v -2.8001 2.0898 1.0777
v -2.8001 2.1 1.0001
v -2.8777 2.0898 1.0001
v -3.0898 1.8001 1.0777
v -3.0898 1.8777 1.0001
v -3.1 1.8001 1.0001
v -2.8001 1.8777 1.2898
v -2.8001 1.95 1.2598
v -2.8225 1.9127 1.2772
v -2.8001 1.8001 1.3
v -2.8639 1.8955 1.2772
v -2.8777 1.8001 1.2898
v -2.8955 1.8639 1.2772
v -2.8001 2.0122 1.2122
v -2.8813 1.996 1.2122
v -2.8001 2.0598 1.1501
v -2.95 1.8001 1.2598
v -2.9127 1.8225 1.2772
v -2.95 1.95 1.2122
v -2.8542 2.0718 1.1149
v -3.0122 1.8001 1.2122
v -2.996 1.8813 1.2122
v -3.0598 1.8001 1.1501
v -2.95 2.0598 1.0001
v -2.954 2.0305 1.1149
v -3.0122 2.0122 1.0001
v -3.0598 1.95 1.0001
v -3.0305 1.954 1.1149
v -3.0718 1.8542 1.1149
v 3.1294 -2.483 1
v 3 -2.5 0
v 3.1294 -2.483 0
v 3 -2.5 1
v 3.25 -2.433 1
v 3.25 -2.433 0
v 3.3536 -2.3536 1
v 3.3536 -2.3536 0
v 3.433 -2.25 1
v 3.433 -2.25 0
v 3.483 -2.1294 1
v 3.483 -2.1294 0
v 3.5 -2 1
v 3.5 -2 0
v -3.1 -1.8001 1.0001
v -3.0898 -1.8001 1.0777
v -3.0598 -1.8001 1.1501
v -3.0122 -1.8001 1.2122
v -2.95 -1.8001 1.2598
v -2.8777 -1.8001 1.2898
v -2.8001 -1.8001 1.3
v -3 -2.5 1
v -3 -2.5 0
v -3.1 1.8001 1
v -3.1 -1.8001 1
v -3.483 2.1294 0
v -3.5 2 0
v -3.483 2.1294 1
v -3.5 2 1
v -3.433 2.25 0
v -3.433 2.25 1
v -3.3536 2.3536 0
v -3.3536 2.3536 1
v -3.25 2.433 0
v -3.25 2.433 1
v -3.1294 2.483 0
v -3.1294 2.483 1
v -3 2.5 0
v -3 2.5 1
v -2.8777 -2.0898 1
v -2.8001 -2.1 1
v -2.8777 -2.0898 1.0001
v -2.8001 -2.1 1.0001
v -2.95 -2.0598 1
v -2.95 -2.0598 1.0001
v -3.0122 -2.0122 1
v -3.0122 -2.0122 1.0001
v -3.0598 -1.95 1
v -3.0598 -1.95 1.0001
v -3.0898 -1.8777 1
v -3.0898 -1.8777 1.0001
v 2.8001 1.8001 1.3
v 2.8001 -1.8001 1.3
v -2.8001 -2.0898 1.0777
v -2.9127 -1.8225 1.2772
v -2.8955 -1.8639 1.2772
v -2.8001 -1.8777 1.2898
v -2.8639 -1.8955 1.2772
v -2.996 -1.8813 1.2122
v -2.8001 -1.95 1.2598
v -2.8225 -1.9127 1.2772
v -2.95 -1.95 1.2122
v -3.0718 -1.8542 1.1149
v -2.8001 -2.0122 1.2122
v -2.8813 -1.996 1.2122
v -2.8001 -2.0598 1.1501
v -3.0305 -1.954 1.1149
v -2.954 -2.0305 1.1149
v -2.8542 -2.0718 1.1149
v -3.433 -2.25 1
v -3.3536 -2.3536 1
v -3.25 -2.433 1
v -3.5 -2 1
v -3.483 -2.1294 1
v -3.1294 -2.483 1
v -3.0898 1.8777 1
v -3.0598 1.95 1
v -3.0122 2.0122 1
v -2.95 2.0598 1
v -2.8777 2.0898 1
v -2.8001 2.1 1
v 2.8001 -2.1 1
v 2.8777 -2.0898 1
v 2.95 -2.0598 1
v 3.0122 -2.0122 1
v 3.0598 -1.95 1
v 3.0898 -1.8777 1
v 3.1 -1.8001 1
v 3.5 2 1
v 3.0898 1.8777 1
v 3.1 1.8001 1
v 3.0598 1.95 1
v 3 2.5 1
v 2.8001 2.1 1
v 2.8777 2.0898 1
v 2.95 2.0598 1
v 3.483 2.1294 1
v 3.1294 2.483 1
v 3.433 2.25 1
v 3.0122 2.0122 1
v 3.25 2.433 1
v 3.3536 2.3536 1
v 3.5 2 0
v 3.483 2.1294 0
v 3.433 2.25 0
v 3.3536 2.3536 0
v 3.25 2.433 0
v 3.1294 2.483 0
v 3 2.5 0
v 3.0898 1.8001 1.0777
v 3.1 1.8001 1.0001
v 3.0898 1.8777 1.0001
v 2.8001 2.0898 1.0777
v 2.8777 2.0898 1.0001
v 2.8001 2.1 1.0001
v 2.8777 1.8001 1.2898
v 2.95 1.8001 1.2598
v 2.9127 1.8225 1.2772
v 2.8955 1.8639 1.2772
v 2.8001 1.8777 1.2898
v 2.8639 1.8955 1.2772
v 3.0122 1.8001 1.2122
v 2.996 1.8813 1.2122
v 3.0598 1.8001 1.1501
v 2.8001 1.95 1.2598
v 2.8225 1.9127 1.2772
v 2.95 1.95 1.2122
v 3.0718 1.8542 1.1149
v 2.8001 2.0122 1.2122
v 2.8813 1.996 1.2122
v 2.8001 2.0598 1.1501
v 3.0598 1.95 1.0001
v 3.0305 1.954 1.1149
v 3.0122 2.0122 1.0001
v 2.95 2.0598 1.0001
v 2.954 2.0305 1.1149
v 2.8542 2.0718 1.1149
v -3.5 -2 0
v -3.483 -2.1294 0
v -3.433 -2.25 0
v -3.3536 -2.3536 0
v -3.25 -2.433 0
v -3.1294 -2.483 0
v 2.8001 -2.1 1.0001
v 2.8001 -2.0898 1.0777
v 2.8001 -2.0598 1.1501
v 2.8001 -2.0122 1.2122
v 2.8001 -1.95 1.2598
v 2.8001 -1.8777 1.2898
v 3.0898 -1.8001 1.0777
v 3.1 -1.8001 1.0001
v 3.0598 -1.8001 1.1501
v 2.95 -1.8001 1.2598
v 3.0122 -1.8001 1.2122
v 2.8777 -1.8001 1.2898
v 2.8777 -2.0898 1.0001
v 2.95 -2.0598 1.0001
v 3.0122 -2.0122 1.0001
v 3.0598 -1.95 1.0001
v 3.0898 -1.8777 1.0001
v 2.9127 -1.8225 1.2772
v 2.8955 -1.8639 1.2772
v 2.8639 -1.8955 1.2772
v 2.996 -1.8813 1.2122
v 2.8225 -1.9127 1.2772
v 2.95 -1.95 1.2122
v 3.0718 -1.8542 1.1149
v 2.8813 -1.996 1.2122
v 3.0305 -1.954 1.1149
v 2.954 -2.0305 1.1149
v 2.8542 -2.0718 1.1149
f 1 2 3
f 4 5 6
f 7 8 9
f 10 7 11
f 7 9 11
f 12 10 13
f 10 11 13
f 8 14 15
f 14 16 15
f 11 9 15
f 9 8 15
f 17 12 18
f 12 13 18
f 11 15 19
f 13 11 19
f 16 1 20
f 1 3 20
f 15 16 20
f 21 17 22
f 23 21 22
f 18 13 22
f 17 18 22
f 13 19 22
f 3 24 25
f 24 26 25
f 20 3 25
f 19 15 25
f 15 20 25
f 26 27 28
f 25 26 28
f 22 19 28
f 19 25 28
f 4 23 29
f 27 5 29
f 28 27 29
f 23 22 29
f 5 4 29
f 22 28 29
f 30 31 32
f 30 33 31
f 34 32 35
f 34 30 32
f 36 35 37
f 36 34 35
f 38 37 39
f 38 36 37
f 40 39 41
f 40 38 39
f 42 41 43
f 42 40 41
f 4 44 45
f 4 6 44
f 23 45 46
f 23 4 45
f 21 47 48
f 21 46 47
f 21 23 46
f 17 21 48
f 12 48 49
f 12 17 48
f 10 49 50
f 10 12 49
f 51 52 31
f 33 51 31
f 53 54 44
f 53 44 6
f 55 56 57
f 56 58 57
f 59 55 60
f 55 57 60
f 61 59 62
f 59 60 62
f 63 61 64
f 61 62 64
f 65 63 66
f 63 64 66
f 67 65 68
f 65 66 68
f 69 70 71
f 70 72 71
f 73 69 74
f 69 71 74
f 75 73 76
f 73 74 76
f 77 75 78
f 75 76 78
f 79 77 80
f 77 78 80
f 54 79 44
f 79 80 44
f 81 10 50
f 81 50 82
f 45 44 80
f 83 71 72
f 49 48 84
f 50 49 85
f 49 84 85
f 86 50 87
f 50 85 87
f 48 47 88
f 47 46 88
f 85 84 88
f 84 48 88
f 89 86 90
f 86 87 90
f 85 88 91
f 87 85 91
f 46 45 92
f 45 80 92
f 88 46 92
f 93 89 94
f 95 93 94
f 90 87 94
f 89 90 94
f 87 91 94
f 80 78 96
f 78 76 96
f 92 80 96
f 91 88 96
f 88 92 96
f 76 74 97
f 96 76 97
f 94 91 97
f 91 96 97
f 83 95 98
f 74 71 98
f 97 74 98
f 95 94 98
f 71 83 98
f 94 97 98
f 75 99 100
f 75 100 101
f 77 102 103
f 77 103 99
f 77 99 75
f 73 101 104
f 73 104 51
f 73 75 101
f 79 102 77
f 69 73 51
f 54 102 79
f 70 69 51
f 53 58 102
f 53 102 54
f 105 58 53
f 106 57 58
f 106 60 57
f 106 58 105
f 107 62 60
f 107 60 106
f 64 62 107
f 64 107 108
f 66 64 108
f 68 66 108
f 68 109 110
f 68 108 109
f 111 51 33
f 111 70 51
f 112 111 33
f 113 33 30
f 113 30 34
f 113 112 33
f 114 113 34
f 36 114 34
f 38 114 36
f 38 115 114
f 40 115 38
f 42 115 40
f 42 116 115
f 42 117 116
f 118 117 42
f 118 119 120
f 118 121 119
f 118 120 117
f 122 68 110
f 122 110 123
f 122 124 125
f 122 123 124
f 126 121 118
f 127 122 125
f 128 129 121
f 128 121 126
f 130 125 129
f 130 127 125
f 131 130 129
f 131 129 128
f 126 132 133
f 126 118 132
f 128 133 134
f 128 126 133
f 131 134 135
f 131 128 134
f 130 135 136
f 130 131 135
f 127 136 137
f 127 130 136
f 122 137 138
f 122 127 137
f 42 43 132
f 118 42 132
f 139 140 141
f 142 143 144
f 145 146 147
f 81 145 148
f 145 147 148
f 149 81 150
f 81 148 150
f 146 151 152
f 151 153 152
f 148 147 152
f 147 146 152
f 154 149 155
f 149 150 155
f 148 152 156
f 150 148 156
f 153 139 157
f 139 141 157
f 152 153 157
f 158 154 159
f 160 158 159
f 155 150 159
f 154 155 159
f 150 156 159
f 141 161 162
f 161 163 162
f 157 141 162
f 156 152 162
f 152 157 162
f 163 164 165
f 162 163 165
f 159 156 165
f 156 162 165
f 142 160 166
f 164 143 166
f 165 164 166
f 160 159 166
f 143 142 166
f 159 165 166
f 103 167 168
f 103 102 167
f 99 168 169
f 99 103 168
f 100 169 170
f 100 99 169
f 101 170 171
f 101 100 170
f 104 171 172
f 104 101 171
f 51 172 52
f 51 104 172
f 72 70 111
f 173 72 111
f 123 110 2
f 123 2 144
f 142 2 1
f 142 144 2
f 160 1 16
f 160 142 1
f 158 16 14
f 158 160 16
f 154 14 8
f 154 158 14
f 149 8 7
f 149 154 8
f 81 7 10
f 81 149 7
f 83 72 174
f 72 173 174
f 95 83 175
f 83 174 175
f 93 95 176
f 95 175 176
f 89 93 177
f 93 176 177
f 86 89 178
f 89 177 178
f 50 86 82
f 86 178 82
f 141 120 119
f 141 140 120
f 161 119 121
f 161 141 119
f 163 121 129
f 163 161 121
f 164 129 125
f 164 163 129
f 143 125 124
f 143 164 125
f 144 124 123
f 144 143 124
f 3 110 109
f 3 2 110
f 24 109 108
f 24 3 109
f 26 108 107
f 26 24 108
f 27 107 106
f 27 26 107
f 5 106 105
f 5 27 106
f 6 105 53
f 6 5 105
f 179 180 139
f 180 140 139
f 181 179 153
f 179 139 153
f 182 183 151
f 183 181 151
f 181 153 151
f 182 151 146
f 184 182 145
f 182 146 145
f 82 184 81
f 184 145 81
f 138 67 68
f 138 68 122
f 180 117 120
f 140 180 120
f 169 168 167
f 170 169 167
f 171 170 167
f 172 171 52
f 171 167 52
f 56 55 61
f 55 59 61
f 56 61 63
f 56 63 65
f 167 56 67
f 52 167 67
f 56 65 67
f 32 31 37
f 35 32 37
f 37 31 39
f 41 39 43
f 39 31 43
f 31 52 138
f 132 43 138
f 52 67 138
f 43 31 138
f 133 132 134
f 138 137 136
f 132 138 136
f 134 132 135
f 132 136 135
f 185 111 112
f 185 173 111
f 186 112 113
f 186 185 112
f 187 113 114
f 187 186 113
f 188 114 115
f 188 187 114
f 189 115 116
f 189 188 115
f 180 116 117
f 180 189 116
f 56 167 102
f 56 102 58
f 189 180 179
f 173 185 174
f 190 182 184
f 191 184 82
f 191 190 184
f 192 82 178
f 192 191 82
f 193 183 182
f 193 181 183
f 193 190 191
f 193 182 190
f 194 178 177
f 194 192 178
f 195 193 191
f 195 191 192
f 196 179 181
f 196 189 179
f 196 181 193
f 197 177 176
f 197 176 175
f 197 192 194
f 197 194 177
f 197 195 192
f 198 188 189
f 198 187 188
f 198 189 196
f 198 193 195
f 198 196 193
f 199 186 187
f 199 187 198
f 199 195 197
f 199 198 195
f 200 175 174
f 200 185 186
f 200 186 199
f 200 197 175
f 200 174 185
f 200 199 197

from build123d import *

# Parameters (mm, degrees)
SKETCH_1_W      = 7
SKETCH_1_H      = 5
EXTRUDE_1_DEPTH = 1
FILLET_1_R      = 0.5
SKETCH_2_W      = 6.2
SKETCH_2_H      = 4.2
EXTRUDE_2_DEPTH = 0.3
FILLET_2_R      = 0.3


with BuildPart() as part:
    # Эскиз1 → Бобышка-Вытянуть1 (new body)
    with BuildSketch(Plane.XY):
        Rectangle(SKETCH_1_W, SKETCH_1_H)
    extrude(amount=EXTRUDE_1_DEPTH)

    # Скругление1
    fillet_1_edges = [part.edges().sort_by_distance(p)[0] for p in [
        (3.5, -2.5, 0.5),
        (-3.5, -2.5, 0.5),
        (-3.5, 2.5, 0.5),
        (3.5, 2.5, 0.5),
    ]]
    fillet(fillet_1_edges, radius=FILLET_1_R)

    # Эскиз2 → Бобышка-Вытянуть2 (add)
    with BuildSketch(Plane.XY.offset(1)):
        Rectangle(SKETCH_2_W, SKETCH_2_H)
    extrude(amount=EXTRUDE_2_DEPTH)

    # Скругление2
    fillet_2_edges = [part.edges().sort_by_distance(p)[0] for p in [
        (3.1, -2.1, 1.15),
        (3.1, 2.1, 1.15),
        (-3.1, 2.1, 1.15),
        (-3.1, -2.1, 1.15),
        (3.1, 0, 1.3),
        (0, 2.1, 1.3),
        (-3.1, 0, 1.3),
        (0, -2.1, 1.3),
    ]]
    fillet(fillet_2_edges, radius=FILLET_2_R - 0.0001)  # a hair under: the kernel refuses the full size


solid = part.part
